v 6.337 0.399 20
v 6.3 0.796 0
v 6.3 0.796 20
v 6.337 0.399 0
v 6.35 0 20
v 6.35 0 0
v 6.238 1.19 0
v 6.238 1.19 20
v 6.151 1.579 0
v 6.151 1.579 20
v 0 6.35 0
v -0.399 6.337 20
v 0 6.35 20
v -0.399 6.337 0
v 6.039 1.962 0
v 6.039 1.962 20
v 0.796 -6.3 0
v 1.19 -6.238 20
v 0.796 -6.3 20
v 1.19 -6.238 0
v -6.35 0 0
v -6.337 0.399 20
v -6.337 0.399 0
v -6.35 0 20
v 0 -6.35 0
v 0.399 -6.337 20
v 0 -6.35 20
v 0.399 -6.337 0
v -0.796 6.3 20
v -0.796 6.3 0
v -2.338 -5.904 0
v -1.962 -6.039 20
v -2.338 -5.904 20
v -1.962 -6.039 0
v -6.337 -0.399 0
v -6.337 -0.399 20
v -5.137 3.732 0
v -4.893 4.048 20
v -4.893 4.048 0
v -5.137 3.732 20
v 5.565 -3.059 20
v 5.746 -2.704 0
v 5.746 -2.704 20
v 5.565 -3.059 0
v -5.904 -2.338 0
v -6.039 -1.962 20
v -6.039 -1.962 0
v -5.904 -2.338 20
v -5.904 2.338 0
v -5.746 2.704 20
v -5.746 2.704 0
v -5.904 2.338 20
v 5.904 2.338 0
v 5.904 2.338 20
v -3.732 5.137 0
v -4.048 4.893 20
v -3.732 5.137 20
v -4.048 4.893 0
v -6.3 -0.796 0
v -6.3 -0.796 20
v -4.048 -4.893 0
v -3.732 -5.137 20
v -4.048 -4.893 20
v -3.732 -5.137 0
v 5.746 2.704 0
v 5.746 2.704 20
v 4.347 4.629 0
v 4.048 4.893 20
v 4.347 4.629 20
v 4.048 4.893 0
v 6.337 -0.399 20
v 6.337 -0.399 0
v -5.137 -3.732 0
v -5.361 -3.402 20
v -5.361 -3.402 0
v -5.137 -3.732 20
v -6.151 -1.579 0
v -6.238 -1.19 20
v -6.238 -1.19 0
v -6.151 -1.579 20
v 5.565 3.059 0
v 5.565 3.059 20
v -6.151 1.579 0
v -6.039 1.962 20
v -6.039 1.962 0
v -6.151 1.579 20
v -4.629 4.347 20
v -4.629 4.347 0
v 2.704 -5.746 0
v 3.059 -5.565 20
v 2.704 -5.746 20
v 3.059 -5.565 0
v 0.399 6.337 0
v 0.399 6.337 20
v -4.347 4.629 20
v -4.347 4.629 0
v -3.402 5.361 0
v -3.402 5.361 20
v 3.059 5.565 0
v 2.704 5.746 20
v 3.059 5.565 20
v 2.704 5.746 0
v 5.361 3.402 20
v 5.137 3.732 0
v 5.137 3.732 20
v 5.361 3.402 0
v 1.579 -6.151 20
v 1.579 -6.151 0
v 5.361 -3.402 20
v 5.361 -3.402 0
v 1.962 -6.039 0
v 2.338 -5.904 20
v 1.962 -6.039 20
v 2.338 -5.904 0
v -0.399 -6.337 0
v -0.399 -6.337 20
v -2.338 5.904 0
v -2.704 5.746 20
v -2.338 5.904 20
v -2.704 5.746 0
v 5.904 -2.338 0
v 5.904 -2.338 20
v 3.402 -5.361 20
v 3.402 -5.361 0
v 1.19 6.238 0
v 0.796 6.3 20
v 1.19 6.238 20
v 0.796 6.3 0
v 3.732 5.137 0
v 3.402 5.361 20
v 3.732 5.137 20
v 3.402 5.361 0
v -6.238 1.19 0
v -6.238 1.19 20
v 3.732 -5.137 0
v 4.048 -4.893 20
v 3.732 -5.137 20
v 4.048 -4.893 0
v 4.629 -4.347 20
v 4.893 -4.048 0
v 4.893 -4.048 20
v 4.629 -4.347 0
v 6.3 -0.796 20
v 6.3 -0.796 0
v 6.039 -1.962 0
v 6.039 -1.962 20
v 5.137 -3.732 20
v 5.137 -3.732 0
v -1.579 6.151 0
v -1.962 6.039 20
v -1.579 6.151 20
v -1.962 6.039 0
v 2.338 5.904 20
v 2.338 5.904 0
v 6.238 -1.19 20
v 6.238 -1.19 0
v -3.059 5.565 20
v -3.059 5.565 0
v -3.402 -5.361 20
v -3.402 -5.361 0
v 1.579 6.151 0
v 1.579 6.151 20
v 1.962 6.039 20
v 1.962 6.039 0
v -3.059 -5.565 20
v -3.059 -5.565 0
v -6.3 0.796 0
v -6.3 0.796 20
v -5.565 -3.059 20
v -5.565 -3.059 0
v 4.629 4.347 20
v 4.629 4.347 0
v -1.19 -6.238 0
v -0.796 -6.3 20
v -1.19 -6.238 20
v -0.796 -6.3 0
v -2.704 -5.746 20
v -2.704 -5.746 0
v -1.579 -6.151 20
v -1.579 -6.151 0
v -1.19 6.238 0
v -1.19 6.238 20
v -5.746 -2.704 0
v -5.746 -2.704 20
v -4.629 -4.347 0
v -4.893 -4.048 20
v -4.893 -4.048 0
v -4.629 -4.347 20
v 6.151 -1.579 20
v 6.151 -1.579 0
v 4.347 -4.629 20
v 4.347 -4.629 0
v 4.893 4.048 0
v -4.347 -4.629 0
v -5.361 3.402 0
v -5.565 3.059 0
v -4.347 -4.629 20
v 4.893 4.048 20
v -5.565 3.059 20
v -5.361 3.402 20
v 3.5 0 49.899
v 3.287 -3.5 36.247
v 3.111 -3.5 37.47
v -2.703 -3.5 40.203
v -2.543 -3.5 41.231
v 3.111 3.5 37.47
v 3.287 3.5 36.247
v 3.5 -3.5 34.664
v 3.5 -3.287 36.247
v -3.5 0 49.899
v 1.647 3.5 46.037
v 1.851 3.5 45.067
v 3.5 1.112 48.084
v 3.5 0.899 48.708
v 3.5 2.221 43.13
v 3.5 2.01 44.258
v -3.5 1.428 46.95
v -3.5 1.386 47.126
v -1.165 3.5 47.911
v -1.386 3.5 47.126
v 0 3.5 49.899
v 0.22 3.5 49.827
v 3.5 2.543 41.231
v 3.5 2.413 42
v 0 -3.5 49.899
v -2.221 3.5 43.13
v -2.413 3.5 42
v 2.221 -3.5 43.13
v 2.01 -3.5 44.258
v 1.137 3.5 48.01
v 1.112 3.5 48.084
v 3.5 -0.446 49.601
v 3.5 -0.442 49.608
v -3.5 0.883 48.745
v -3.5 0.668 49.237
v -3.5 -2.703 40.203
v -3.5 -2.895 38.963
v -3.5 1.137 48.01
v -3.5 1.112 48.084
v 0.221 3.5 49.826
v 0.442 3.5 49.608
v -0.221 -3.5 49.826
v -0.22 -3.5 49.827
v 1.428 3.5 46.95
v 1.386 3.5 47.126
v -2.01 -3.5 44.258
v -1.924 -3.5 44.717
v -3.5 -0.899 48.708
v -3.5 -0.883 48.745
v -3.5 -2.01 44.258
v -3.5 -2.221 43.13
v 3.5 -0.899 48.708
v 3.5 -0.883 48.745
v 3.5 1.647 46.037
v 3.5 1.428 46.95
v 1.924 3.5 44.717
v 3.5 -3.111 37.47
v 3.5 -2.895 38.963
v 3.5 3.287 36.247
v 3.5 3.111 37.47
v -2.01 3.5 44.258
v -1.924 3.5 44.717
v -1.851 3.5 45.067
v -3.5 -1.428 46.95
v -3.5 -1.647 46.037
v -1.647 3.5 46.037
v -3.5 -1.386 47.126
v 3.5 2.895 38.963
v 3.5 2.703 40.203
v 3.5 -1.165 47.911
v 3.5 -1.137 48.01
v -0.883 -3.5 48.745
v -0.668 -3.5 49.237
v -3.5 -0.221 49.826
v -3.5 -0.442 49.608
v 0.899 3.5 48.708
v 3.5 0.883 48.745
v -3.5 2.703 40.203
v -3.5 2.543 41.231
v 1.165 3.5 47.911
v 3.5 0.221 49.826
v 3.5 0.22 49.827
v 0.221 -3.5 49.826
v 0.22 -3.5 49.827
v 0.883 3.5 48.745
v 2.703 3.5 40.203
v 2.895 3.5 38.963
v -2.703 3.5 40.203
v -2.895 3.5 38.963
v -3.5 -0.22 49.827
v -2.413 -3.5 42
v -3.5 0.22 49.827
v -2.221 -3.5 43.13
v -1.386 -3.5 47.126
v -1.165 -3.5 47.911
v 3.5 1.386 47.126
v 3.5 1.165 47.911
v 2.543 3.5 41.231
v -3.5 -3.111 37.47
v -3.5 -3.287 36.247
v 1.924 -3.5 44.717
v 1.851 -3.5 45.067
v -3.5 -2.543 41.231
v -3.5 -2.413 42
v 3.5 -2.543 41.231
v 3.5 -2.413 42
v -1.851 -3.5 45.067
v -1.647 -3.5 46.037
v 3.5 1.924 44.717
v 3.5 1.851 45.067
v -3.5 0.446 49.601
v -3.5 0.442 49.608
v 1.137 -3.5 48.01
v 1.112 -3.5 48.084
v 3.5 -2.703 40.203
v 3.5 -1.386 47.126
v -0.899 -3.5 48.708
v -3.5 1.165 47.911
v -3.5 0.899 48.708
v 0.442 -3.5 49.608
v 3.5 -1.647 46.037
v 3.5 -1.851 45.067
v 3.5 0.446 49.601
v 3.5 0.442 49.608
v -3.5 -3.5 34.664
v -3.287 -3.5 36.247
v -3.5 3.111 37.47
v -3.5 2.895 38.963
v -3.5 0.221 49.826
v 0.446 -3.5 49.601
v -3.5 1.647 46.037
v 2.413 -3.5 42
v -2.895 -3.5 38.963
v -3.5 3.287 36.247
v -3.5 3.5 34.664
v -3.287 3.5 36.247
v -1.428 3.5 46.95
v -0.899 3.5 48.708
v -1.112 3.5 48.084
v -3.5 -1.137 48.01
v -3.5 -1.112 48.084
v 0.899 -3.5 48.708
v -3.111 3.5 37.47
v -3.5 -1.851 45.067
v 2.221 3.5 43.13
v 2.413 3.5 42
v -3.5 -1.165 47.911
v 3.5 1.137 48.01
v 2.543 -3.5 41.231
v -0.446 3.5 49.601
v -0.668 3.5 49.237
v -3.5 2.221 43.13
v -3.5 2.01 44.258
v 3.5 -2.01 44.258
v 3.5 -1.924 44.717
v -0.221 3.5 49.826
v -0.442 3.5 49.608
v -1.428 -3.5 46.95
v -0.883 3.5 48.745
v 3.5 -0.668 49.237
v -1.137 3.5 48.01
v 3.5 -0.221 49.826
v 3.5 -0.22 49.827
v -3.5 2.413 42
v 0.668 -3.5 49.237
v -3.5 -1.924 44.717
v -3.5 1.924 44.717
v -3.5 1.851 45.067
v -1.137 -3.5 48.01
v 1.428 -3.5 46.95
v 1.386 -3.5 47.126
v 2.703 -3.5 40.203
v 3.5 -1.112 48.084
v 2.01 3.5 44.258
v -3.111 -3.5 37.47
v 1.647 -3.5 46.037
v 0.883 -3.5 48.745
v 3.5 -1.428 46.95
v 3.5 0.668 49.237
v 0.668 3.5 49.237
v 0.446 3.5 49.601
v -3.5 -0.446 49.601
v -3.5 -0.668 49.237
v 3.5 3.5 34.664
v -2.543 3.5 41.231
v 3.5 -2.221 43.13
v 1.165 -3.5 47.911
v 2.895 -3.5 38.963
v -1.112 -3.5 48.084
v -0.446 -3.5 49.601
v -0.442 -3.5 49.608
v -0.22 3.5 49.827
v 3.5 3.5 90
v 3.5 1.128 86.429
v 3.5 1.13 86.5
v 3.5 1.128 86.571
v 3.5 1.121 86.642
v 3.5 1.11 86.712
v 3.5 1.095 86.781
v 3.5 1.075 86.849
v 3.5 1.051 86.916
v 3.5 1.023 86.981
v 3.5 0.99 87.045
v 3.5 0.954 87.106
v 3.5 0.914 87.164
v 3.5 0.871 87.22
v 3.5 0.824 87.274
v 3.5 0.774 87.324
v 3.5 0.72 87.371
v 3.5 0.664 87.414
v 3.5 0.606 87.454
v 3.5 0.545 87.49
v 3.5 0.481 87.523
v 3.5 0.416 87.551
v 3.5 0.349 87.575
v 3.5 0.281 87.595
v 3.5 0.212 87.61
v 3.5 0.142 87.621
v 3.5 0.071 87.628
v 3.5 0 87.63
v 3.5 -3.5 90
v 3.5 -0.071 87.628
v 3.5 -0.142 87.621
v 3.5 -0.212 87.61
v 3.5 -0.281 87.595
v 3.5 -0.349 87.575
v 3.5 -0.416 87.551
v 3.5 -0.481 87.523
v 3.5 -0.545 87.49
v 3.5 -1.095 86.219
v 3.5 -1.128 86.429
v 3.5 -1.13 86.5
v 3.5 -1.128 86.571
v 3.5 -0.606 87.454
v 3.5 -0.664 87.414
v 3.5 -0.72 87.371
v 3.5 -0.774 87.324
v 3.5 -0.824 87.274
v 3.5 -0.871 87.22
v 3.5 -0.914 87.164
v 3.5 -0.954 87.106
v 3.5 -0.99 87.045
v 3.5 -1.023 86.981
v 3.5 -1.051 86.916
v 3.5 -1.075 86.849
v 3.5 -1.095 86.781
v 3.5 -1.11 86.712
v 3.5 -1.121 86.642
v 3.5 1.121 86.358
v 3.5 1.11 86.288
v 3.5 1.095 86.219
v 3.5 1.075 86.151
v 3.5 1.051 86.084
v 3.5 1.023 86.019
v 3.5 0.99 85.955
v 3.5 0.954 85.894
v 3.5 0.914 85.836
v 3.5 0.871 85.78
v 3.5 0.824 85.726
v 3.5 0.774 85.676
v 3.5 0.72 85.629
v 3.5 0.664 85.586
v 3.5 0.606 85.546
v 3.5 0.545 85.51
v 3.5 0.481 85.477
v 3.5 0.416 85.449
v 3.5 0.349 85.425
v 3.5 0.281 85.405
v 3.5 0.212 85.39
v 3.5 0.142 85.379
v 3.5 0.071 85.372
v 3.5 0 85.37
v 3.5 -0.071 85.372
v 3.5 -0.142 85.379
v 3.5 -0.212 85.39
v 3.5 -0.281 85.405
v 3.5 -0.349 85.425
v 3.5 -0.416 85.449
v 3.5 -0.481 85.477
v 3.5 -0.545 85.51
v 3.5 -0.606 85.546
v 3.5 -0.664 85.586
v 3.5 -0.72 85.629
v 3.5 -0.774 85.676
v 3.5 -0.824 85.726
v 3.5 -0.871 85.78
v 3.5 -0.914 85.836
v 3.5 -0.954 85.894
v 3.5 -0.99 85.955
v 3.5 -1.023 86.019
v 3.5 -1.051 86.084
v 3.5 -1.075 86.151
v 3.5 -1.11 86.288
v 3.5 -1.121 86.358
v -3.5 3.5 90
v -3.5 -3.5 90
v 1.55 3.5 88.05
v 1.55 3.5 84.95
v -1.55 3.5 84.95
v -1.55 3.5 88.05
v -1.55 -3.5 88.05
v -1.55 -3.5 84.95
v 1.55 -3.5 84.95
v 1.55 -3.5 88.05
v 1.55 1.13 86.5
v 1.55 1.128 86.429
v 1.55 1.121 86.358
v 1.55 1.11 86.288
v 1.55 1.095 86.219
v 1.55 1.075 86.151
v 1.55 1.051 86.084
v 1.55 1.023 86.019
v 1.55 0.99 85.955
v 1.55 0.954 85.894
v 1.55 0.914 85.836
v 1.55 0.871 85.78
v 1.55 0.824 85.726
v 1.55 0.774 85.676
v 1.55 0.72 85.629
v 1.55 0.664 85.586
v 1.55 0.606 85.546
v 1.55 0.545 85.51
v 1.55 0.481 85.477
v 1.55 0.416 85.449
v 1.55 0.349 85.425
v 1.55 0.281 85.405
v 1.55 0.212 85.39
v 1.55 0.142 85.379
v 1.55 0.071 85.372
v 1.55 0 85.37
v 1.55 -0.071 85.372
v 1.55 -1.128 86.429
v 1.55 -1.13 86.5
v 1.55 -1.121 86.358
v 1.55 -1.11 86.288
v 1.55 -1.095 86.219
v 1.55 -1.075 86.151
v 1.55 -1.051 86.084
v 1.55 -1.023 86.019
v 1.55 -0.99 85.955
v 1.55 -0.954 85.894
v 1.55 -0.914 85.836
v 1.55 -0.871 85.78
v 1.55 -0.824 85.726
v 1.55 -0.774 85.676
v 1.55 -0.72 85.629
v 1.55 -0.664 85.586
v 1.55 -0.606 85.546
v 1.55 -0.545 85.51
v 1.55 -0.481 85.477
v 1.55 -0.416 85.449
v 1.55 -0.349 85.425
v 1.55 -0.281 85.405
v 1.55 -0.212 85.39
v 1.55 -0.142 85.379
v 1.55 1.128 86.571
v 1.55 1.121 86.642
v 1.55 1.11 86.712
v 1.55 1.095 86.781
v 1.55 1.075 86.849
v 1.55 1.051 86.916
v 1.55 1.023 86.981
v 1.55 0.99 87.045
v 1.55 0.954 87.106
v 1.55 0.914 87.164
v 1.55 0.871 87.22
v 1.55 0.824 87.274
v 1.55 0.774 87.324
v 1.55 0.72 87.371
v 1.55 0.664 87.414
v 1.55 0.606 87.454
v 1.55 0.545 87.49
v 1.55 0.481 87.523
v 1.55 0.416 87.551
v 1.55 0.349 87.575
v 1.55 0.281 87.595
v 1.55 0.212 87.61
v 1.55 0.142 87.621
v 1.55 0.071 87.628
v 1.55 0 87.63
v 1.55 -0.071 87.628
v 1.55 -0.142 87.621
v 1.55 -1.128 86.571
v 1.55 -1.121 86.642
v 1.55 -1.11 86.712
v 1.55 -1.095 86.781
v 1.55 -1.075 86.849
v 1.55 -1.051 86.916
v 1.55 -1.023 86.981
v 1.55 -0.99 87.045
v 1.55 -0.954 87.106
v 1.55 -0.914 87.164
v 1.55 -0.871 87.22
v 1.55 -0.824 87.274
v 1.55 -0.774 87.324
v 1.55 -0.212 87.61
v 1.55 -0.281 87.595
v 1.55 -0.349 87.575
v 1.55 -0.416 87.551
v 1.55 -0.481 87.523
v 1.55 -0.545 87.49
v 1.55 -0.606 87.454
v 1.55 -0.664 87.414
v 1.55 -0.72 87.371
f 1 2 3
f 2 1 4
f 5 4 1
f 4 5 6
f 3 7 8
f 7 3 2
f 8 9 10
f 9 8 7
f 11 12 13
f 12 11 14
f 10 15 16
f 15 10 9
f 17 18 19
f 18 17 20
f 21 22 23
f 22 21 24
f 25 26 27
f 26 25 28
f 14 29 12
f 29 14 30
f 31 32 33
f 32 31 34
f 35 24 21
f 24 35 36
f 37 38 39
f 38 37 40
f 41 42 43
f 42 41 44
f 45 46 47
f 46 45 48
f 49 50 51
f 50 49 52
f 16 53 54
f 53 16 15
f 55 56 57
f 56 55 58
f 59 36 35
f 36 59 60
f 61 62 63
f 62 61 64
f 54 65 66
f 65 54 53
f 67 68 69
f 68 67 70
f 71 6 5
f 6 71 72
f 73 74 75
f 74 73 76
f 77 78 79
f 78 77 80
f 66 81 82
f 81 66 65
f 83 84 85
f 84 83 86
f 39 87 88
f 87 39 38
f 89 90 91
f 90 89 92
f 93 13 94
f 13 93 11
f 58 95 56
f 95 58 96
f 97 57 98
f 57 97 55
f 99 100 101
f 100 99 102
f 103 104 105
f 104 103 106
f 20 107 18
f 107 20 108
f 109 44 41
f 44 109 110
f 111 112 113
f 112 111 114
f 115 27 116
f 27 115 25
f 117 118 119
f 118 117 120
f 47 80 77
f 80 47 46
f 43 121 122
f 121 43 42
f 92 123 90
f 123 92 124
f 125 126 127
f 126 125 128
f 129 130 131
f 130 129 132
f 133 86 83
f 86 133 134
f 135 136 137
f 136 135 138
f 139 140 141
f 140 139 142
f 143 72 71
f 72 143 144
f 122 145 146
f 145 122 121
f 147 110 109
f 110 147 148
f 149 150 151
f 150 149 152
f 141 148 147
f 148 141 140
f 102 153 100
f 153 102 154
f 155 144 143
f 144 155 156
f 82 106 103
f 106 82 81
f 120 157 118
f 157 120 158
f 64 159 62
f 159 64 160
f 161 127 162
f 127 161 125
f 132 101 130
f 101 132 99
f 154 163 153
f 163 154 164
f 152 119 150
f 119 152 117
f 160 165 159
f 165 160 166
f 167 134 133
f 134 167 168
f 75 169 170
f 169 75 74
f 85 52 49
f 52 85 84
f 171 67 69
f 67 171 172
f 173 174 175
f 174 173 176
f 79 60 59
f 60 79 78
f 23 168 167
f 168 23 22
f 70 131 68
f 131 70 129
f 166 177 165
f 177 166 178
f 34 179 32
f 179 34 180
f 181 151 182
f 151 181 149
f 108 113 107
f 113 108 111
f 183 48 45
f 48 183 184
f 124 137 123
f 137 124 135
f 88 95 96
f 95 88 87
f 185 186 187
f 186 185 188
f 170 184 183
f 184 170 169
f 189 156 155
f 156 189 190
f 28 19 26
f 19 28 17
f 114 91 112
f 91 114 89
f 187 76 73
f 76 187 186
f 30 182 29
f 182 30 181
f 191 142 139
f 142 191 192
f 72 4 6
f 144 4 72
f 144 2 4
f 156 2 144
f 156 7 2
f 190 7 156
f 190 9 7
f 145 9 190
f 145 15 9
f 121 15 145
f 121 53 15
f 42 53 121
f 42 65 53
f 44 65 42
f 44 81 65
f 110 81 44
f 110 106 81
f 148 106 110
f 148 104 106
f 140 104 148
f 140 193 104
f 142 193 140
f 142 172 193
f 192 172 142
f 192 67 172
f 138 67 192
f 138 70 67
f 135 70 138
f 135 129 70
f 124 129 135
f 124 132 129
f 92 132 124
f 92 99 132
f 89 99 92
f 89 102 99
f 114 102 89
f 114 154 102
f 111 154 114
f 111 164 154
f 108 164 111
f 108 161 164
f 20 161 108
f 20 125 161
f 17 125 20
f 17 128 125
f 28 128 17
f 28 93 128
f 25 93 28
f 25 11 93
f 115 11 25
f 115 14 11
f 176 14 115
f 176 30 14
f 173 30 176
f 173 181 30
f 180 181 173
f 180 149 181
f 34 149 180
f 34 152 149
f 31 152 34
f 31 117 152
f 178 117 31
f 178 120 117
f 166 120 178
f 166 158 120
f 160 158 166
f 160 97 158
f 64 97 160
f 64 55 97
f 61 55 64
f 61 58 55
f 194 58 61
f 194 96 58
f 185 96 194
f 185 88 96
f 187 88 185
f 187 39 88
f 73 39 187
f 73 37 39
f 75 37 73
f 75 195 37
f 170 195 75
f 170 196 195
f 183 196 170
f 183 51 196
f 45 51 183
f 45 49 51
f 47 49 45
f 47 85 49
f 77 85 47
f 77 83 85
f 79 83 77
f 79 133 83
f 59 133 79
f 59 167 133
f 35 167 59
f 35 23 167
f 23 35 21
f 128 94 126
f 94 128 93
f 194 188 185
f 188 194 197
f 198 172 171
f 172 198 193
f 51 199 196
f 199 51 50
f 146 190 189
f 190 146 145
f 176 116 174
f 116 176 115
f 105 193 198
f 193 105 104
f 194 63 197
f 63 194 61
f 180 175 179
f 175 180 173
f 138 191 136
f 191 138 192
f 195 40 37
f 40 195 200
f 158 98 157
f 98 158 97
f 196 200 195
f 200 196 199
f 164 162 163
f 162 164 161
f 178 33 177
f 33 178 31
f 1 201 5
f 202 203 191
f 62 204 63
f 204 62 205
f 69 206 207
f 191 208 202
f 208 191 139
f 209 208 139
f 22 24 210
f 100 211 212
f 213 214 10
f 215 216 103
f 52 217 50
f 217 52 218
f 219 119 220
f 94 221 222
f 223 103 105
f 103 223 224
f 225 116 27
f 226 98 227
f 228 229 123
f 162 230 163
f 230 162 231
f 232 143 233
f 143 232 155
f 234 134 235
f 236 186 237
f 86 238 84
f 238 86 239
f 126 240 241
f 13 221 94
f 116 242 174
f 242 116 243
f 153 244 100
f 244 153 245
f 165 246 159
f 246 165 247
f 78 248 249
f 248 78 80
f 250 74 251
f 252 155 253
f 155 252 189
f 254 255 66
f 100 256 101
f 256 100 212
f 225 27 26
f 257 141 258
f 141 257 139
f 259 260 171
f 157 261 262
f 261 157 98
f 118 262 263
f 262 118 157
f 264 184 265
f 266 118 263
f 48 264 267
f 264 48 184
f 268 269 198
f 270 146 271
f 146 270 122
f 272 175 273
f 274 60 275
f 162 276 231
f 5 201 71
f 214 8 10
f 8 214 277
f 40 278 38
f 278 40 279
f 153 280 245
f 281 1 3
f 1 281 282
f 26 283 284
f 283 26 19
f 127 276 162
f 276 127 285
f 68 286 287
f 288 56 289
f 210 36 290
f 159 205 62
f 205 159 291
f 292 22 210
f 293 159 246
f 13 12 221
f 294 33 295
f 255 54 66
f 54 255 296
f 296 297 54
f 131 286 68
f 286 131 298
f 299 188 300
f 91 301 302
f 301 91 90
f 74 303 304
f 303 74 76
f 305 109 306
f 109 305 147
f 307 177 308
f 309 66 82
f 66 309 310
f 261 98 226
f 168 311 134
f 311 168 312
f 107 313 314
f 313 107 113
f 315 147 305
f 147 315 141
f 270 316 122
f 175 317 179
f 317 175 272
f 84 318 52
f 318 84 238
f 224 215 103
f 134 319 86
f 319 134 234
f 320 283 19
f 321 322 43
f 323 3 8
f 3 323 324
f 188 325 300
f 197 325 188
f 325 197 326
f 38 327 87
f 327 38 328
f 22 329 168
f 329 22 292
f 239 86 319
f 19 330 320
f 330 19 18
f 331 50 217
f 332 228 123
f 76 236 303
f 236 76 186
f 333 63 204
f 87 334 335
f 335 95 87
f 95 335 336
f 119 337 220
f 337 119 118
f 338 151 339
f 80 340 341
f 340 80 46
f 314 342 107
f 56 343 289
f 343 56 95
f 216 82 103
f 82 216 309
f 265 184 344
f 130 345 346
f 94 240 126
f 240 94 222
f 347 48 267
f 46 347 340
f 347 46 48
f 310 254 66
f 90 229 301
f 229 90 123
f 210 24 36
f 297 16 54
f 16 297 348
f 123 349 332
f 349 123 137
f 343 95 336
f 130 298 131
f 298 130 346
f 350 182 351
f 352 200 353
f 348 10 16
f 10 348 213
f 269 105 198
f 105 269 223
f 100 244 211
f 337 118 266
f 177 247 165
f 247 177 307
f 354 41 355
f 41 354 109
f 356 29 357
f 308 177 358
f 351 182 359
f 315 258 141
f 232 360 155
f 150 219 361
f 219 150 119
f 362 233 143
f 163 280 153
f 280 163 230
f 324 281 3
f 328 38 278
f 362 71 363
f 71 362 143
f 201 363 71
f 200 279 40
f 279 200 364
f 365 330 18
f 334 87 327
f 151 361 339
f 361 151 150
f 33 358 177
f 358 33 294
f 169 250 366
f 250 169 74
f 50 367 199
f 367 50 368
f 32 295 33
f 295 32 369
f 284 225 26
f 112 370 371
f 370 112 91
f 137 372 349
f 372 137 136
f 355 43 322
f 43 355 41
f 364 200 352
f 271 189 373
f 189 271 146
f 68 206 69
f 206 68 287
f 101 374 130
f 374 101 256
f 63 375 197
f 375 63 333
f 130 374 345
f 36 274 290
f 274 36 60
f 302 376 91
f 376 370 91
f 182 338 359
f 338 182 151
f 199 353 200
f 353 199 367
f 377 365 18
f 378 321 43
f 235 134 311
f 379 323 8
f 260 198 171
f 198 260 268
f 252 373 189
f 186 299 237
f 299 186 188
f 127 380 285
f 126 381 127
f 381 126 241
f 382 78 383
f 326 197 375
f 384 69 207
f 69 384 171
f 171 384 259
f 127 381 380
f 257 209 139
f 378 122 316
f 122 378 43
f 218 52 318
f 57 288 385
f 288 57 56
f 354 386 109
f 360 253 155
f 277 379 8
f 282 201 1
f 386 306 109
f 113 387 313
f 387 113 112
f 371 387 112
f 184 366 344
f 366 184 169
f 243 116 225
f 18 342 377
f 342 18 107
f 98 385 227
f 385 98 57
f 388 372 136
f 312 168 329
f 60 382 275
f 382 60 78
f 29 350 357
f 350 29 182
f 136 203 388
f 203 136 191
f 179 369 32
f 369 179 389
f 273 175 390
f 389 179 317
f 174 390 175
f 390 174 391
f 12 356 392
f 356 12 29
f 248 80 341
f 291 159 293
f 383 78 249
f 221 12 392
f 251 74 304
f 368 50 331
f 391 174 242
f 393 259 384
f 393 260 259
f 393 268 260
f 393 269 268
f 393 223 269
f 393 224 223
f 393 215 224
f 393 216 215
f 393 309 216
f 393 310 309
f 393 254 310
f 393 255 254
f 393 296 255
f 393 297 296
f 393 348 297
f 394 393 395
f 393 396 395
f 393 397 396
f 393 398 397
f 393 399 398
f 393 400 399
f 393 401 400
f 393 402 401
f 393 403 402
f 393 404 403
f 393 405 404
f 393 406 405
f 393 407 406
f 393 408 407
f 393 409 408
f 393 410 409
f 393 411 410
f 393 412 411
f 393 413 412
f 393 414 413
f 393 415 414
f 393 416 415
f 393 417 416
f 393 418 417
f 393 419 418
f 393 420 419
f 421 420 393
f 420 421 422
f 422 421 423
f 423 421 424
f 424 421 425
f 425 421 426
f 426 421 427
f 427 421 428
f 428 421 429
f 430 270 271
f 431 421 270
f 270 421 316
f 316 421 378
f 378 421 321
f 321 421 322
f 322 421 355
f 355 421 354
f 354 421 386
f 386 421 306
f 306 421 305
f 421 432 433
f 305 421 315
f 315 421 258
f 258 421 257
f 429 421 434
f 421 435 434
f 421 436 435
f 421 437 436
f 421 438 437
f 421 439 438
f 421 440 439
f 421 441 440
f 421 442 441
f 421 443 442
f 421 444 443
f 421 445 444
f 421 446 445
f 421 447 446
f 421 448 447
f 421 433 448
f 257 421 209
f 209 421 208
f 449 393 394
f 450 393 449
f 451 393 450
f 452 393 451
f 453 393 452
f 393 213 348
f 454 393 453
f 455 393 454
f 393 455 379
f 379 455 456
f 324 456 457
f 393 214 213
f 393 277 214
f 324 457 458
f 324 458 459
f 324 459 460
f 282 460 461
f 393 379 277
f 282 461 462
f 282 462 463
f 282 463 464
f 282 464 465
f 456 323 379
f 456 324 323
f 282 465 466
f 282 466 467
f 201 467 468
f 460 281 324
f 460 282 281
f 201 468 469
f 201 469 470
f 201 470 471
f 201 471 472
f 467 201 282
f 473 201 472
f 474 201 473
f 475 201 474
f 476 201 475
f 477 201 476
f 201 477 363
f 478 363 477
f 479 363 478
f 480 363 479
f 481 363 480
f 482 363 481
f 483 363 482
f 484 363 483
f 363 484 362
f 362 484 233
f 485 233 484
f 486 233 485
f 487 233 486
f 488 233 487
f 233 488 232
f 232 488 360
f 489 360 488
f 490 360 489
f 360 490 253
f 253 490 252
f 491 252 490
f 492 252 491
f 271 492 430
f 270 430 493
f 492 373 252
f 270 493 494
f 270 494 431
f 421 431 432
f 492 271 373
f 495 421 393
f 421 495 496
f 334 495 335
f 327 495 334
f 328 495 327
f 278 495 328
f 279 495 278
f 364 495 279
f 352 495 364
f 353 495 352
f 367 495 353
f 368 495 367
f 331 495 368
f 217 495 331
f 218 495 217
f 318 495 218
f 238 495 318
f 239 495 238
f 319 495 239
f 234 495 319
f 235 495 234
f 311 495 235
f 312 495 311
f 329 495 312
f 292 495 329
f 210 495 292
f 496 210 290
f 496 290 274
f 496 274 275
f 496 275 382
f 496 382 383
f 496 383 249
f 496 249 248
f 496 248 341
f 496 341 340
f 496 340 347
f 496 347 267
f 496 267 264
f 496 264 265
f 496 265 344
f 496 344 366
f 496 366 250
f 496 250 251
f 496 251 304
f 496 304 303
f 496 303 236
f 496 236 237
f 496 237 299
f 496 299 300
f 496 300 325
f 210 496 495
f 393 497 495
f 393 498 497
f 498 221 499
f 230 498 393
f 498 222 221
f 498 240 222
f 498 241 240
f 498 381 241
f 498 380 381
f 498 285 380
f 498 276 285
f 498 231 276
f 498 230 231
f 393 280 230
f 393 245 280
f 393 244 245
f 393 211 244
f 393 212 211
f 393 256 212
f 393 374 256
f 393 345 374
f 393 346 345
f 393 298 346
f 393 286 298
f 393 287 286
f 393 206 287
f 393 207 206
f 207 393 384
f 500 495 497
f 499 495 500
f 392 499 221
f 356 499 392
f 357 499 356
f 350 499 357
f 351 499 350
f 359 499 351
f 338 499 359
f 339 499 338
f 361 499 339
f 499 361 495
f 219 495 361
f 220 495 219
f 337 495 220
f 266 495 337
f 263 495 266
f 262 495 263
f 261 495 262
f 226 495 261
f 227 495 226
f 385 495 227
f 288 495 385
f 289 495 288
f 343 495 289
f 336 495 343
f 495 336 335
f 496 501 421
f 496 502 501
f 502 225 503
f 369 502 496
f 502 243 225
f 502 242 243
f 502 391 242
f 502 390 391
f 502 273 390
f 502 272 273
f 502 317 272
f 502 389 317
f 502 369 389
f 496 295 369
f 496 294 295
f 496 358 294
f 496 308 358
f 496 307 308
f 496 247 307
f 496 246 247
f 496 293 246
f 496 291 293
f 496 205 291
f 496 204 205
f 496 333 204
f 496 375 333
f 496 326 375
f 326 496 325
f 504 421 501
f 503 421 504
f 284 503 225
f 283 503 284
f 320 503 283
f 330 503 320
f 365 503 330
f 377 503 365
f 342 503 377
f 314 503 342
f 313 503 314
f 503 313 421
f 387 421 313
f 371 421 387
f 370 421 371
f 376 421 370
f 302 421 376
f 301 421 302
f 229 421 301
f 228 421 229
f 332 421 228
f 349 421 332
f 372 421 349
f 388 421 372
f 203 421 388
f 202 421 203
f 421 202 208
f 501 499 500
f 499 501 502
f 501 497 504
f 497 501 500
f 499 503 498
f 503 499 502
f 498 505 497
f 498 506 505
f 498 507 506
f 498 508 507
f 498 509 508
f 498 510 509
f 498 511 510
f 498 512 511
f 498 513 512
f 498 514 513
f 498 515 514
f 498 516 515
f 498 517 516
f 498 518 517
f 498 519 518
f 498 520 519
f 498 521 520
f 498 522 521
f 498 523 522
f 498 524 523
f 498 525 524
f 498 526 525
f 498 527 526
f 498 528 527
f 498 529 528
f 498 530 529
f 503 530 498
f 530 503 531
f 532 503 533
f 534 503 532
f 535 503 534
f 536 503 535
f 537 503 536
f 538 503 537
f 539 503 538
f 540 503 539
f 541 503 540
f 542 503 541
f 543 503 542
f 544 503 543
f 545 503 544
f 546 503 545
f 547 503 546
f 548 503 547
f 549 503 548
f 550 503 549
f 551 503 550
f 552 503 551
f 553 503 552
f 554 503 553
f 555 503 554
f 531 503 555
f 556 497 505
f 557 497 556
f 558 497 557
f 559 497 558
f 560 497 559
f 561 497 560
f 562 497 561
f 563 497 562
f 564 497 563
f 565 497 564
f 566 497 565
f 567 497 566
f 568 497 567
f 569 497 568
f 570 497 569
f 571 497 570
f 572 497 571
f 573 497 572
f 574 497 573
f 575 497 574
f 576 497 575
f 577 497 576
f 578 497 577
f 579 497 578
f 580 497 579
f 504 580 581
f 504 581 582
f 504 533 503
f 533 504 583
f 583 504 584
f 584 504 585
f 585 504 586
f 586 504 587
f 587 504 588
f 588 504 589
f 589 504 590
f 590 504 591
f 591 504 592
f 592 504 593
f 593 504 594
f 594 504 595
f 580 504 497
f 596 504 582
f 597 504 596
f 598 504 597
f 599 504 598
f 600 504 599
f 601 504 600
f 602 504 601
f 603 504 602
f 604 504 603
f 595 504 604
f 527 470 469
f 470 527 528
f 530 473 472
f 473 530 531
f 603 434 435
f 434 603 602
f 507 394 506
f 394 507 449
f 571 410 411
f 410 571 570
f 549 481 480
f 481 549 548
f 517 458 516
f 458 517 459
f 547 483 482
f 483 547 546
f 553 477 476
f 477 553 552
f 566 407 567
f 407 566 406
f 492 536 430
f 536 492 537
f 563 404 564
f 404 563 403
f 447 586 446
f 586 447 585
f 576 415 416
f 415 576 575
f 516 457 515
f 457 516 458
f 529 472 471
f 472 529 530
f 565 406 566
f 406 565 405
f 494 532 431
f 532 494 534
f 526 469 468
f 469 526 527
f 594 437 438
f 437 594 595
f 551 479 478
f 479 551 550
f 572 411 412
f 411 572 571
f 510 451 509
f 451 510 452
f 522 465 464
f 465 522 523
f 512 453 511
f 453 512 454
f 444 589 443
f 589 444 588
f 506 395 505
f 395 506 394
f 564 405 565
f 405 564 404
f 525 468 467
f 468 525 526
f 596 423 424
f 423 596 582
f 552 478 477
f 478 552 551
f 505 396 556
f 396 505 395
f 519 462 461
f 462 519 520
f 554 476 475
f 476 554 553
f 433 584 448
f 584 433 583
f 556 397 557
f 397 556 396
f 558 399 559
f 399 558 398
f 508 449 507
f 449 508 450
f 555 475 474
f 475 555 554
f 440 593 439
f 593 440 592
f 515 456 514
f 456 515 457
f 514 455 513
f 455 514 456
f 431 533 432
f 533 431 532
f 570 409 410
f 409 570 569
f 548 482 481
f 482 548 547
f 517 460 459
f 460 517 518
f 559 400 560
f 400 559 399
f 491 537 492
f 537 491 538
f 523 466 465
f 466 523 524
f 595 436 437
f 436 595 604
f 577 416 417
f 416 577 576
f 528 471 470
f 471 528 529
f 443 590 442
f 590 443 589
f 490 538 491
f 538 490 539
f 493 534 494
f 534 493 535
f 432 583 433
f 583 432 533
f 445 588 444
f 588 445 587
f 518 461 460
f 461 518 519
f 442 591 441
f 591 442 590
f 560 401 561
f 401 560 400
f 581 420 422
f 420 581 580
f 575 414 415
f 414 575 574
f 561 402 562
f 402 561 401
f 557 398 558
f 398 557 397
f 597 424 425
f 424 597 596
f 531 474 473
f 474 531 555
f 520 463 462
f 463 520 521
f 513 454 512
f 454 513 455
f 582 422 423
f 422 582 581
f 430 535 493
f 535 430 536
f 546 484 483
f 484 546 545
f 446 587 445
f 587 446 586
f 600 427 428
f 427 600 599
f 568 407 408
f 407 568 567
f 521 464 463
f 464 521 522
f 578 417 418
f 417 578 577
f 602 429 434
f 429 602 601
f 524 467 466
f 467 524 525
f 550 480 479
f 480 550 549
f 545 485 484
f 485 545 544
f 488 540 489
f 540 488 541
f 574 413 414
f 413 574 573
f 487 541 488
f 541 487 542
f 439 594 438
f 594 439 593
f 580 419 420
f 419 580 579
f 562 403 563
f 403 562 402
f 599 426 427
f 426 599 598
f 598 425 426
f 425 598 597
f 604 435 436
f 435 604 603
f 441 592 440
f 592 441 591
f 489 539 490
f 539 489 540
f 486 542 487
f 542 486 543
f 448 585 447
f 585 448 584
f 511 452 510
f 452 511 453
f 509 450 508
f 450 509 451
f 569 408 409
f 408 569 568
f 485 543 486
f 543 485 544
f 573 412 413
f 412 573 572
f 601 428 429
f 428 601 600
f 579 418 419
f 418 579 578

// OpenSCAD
// Gerbil Headpost Holder - Hollowed
// Units: mm

/* [Parameters] */
$fn = 100; 
eps = 0.01;

// Base Dimensions (1/2 inch optical post)
base_dia = 12.7; 
base_height = 20;

// Taper Dimensions
taper_height = 20;

// Tip/Head Dimensions
tip_dia = 7;
tip_height = 50;

// Socket Dimensions
socket_side = 3.1;

// Set Screw Dimensions
screw_dia = 2.2606; 
screw_pos_z = 5; // Distance from the top face to screw center

/* [Hollowing Parameters] */
wall_thickness = 1.5; // Outer wall thickness
solid_top_depth = 15; // Leave top solid for socket and screw strength

// Helper calculation
total_height = base_height + taper_height + tip_height;
taper_dia = sqrt(2 * tip_dia^2);

/* [Rendering] */
difference() {
    // Main Body
    union() {
        cylinder(d = base_dia, h = base_height);
        
        translate([0, 0, base_height])
            cylinder(d1 = base_dia, d2 = tip_dia, h = taper_height+taper_dia);
            
        translate([0, 0, total_height / 2])
            //cylinder(tip_height, d = tip_dia, center=true);
            cube([tip_dia, tip_dia, total_height], center=true);
    }

    // SUBTRACTION 1: Square Headpost Socket
    // We position the cube so it starts at the very top and goes down
    translate([0, 0, total_height - (tip_dia / 2)])
        rotate([90, 0, 0]) // Note: See comment below about this rotation
        cube([socket_side, socket_side, tip_dia + eps], center = true);

    // SUBTRACTION 2: Set Screw Hole
    translate([0, 0, total_height - (tip_dia / 2)])
        rotate([0, 90, 0])
            cylinder(d = screw_dia, h = tip_dia, center = false);
            
    // SUBTRACTION 3: Hollowing Void
    // Leaves bottom open to allow uncured resin/powder to escape
    /*
    translate([0, 0, -0.1])
    union() {
        // Hollow base
        cylinder(d = base_dia - 2 * wall_thickness, h = base_height + 0.2);
        
        // Hollow taper
        translate([0, 0, base_height])
            cylinder(d1 = base_dia - 2 * wall_thickness, d2 = tip_dia - 2 * wall_thickness, h = taper_height + 0.1);
            
        // Hollow tip (stops before the solid top region)
        translate([0, 0, base_height + taper_height])
            cylinder(d = tip_dia - 2 * wall_thickness, h = tip_height - solid_top_depth);
    }
    */

}
